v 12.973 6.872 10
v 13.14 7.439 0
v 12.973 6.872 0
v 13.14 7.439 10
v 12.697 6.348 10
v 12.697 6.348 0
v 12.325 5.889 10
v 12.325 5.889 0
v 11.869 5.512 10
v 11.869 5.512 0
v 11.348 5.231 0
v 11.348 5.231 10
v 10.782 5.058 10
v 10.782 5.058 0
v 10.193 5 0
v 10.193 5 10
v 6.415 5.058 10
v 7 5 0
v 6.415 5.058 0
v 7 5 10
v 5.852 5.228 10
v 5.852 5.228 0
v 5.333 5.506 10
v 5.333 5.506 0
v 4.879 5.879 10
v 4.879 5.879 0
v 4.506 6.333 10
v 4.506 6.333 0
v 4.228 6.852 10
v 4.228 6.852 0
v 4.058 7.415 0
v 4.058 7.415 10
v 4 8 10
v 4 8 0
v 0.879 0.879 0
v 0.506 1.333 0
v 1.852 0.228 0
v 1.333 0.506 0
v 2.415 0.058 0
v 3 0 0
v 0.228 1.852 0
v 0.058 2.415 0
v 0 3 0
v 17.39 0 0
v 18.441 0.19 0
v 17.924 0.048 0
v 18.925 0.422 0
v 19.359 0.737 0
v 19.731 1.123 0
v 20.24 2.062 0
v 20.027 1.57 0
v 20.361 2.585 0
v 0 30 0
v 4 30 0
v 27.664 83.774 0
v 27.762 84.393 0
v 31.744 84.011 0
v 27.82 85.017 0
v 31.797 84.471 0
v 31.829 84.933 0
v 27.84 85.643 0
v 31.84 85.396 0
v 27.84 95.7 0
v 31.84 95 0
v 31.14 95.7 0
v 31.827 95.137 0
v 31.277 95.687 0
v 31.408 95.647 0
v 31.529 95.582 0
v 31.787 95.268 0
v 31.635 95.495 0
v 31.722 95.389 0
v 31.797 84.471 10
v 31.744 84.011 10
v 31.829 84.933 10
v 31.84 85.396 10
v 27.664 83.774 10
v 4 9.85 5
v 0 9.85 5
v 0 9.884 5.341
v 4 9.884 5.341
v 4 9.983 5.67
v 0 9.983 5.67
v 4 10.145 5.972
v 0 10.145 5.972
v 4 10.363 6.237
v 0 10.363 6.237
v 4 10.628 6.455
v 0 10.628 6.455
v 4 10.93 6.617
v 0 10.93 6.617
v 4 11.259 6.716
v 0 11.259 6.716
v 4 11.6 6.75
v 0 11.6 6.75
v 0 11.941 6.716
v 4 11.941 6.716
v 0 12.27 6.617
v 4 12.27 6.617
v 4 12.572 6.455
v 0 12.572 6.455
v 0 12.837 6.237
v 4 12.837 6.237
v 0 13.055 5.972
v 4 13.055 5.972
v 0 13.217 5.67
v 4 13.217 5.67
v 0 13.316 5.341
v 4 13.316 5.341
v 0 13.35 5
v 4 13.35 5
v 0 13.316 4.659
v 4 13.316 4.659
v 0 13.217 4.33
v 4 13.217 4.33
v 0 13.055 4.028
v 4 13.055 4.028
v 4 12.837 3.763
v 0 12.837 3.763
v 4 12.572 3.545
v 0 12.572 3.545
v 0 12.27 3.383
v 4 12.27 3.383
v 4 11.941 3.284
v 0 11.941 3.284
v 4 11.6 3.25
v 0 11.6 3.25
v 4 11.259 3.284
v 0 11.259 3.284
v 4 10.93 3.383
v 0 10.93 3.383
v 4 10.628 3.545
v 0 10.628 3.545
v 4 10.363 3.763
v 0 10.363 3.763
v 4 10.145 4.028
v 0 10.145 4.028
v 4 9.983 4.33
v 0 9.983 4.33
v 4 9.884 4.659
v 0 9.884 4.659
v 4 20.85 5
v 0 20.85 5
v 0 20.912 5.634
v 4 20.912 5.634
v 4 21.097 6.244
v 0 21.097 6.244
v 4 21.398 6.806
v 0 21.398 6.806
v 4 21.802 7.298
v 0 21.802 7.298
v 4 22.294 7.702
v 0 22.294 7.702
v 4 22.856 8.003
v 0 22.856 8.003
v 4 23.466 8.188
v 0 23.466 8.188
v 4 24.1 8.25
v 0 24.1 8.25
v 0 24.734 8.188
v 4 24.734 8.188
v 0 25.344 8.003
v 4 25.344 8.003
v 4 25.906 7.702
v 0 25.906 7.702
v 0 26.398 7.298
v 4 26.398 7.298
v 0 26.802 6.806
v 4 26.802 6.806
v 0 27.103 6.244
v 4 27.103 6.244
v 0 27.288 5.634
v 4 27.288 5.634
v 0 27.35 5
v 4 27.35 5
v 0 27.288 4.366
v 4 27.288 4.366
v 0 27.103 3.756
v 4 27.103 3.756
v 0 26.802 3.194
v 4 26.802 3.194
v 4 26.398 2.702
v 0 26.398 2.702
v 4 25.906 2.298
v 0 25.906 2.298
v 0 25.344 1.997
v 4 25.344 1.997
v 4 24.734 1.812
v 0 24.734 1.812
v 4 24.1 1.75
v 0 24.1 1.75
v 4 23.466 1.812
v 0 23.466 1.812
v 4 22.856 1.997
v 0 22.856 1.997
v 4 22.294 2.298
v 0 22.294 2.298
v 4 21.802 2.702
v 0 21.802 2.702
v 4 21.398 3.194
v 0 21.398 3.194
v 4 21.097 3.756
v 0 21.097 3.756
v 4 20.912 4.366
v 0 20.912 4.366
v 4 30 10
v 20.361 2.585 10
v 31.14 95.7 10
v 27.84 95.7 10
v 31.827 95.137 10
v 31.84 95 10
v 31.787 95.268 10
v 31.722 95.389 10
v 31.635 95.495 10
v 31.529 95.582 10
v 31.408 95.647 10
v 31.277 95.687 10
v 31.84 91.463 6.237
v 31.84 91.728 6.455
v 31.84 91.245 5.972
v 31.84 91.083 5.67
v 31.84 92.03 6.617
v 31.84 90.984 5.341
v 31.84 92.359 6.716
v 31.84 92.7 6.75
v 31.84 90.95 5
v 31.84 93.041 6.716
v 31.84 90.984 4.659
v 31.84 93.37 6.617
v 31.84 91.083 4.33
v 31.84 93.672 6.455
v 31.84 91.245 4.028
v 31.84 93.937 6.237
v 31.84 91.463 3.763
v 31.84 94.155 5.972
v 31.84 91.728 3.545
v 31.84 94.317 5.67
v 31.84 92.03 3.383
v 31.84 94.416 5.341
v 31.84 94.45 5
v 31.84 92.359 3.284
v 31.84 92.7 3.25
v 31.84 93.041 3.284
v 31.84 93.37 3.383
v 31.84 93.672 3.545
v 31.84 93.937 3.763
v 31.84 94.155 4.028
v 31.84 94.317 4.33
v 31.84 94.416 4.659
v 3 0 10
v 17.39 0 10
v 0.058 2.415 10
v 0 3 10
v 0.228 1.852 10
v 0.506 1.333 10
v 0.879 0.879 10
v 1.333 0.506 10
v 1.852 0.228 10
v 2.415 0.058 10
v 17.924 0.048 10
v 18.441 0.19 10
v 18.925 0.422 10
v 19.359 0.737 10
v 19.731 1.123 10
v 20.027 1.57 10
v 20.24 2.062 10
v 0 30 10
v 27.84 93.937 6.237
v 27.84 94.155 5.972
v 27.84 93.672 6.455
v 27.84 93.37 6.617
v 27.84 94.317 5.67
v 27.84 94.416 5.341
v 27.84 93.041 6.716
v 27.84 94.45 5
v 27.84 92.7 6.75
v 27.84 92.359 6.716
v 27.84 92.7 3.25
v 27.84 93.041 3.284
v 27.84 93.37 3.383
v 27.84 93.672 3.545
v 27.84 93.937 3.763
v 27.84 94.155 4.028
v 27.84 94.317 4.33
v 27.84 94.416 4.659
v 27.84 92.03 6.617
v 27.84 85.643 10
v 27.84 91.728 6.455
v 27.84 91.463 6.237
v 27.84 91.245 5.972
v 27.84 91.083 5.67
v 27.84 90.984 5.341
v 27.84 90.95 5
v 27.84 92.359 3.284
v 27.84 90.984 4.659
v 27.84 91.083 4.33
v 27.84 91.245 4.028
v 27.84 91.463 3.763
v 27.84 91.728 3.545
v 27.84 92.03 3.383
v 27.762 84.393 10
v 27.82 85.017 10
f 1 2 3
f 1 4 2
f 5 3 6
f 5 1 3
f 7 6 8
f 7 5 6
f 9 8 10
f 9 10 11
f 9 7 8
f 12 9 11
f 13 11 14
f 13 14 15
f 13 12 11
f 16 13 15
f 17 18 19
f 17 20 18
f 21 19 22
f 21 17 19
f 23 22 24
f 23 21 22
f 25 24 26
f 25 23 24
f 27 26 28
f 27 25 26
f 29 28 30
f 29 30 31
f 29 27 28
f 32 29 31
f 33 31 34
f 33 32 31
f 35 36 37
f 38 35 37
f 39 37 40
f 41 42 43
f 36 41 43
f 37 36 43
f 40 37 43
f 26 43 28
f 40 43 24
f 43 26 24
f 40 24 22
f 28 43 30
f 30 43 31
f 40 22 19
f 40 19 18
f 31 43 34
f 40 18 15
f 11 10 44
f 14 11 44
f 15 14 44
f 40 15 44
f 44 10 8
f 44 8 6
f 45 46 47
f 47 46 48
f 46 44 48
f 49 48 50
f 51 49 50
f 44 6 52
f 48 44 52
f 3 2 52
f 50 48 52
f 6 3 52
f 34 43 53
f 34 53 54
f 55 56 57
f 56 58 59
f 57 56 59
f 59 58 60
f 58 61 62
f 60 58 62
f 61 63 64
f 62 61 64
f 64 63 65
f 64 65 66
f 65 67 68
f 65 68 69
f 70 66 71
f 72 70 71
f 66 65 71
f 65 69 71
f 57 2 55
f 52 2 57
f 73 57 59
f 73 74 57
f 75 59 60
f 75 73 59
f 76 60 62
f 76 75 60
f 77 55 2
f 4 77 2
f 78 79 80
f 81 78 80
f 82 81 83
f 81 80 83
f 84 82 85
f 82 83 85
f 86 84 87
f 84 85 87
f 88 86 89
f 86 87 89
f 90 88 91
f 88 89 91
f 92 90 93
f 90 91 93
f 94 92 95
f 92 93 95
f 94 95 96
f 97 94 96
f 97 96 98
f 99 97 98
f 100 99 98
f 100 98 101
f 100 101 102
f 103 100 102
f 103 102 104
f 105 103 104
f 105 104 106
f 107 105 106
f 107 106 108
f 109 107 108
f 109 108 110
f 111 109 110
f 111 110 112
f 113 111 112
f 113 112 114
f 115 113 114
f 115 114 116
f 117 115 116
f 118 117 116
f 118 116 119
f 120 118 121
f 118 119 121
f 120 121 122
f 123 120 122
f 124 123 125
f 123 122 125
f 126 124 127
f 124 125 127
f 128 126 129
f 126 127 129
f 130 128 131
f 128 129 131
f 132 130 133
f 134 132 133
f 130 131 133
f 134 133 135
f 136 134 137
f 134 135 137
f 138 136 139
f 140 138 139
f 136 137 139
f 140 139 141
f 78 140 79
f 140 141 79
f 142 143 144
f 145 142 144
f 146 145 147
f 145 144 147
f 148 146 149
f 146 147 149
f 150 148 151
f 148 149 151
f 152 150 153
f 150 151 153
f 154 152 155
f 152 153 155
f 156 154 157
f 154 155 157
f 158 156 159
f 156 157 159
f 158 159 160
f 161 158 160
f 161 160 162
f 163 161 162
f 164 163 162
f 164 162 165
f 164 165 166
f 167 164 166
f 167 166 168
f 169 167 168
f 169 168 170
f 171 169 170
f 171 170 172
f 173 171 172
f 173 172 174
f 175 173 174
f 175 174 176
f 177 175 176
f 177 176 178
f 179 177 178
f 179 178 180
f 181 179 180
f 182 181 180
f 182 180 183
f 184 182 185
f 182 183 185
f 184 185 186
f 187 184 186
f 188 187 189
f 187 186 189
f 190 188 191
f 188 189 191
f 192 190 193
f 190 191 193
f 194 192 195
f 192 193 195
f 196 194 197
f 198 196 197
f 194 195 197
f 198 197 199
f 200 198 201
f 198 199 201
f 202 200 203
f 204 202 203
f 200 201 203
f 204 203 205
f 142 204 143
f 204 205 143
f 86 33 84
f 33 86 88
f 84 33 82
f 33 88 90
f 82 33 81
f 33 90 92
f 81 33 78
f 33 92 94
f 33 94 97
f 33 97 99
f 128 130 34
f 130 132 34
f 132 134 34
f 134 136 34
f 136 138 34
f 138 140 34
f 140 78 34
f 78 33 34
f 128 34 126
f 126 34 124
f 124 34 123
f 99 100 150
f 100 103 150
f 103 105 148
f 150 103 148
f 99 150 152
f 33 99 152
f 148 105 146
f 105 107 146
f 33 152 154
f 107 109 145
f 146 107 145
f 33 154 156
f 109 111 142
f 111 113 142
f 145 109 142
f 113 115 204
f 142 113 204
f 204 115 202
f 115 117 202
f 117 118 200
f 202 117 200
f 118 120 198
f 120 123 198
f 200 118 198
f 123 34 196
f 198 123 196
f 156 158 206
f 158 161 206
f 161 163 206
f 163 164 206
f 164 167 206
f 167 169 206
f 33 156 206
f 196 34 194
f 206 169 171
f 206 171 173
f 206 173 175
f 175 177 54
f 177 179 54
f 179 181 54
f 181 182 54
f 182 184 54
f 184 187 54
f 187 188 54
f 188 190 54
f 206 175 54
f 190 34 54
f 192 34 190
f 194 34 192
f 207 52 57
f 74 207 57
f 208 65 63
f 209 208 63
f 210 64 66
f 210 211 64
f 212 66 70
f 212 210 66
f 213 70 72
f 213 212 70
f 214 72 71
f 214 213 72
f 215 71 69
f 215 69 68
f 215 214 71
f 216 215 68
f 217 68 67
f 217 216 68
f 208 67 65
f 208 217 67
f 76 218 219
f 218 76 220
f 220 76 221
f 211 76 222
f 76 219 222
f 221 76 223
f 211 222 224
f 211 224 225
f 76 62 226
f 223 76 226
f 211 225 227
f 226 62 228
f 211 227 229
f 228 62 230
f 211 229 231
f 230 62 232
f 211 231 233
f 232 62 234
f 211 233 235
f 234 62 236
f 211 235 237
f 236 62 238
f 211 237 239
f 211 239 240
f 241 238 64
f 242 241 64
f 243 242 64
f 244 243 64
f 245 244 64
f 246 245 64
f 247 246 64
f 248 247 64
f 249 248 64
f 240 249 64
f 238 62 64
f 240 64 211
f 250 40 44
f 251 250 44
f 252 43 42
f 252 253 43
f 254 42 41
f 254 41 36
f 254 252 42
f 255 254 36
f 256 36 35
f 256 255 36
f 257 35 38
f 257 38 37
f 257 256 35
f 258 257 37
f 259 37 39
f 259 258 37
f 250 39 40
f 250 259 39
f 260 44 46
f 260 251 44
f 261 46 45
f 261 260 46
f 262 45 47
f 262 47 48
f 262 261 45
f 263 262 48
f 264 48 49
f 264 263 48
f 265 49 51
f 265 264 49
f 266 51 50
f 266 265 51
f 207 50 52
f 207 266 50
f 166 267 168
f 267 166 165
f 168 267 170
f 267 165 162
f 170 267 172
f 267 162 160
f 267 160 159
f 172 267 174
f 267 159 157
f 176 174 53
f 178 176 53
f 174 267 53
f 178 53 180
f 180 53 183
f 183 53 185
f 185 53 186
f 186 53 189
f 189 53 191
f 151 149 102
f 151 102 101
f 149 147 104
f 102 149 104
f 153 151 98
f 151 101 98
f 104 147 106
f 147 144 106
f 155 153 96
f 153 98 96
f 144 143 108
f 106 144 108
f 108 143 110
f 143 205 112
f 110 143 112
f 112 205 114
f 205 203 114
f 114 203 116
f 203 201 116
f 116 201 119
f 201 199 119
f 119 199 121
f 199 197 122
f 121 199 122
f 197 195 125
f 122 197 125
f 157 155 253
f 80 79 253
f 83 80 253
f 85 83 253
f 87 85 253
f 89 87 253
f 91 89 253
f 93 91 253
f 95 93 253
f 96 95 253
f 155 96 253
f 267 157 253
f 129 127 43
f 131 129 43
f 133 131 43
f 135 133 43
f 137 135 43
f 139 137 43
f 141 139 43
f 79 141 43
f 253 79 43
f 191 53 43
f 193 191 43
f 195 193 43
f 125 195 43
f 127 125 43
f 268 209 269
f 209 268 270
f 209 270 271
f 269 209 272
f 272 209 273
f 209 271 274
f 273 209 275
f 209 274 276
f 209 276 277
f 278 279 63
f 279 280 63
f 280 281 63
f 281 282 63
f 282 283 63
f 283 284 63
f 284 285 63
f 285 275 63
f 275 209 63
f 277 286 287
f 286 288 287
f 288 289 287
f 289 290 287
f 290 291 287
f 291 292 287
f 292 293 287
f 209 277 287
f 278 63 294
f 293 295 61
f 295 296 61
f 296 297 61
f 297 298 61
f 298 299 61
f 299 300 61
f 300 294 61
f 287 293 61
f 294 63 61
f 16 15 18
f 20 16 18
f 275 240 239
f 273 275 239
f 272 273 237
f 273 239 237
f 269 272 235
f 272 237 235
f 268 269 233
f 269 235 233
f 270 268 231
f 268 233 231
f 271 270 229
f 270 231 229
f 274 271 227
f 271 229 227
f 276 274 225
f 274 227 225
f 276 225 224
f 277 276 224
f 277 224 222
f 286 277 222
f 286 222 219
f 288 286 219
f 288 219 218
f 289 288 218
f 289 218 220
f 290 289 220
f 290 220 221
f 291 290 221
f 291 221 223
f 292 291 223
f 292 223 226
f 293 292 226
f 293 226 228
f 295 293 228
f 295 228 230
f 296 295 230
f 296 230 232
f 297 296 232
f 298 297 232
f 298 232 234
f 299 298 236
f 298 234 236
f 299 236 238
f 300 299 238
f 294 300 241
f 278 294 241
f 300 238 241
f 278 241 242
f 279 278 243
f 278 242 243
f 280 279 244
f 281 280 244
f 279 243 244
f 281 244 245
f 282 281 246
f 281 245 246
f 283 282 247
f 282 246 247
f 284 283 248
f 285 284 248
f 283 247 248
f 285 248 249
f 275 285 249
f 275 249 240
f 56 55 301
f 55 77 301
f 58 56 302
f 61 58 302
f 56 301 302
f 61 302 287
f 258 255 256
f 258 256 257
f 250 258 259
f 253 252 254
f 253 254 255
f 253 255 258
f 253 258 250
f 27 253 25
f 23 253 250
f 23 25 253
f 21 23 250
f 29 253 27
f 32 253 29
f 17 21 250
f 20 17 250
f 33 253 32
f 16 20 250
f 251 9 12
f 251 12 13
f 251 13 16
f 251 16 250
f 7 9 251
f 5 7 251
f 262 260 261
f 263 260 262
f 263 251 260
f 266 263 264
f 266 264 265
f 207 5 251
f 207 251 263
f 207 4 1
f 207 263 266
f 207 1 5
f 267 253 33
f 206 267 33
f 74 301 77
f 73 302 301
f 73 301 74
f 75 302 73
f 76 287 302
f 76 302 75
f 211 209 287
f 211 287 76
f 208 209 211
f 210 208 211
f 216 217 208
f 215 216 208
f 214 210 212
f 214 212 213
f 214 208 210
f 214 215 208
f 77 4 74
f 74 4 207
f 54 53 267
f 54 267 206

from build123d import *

# Parameters (mm, degrees)
F0_W     = 4
F0_H     = 25
F1_DEPTH = 10
F2_R     = 3
F3_R     = 10
F4_R     = 1.75
F5_DEPTH = 5
F6_R     = 3.25
F6_R_2   = 1.75
F7_DEPTH = 6
F8_R     = 0.7


# Not quite as in the source:
# - a feature names something its author has since deleted; it is built from what else it names


with BuildPart() as f1:
    # F0 (on Top) → F1 (new body)
    with BuildSketch(Plane.XY):
        with Locations((2, 17.5)):
            Rectangle(F0_W, F0_H)
        Polygon((0, 5), (0, 0), (20, 0), (31.84, 84.7), (31.84, 95.7), (27.84, 95.7), (27.84, 84.7), (12.6761412248, 5), (4, 5), align=None)
    extrude(amount=F1_DEPTH)

    # F2
    f2_edges = [f1.edges().sort_by_distance(p)[0] for p in [
        (12.676141, 5, 5),
        (4, 5, 5),
        (0, 0, 5),
        (20, 0, 5),
    ]]
    fillet(f2_edges, radius=F2_R)

    # F3
    f3_edges = [f1.edges().sort_by_distance(p)[0] for p in [
        (27.84, 84.7, 5),
        (31.84, 84.7, 5),
    ]]
    fillet(f3_edges, radius=F3_R)

    # F4 (on face) → F5 (cut)
    with BuildSketch(Plane.YZ.offset(31.84)):
        with Locations((92.7, 5)):
            Circle(F4_R)
    extrude(amount=-F5_DEPTH, mode=Mode.SUBTRACT)

    # F6 (on face) → F7 (cut)
    with BuildSketch(Plane(origin=(0, 0, 0), x_dir=(0, -1, 0), z_dir=(-1, 0, 0))):
        with Locations((-24.1, 5)):
            Circle(F6_R)
        with Locations((-11.6, 5)):
            Circle(F6_R_2)
    extrude(amount=-F7_DEPTH, mode=Mode.SUBTRACT)

    # F8
    f8_edges = [f1.edges().sort_by_distance(p)[0] for p in [
        (31.84, 95.7, 5),
    ]]
    fillet(f8_edges, radius=F8_R)


solid = f1.part
